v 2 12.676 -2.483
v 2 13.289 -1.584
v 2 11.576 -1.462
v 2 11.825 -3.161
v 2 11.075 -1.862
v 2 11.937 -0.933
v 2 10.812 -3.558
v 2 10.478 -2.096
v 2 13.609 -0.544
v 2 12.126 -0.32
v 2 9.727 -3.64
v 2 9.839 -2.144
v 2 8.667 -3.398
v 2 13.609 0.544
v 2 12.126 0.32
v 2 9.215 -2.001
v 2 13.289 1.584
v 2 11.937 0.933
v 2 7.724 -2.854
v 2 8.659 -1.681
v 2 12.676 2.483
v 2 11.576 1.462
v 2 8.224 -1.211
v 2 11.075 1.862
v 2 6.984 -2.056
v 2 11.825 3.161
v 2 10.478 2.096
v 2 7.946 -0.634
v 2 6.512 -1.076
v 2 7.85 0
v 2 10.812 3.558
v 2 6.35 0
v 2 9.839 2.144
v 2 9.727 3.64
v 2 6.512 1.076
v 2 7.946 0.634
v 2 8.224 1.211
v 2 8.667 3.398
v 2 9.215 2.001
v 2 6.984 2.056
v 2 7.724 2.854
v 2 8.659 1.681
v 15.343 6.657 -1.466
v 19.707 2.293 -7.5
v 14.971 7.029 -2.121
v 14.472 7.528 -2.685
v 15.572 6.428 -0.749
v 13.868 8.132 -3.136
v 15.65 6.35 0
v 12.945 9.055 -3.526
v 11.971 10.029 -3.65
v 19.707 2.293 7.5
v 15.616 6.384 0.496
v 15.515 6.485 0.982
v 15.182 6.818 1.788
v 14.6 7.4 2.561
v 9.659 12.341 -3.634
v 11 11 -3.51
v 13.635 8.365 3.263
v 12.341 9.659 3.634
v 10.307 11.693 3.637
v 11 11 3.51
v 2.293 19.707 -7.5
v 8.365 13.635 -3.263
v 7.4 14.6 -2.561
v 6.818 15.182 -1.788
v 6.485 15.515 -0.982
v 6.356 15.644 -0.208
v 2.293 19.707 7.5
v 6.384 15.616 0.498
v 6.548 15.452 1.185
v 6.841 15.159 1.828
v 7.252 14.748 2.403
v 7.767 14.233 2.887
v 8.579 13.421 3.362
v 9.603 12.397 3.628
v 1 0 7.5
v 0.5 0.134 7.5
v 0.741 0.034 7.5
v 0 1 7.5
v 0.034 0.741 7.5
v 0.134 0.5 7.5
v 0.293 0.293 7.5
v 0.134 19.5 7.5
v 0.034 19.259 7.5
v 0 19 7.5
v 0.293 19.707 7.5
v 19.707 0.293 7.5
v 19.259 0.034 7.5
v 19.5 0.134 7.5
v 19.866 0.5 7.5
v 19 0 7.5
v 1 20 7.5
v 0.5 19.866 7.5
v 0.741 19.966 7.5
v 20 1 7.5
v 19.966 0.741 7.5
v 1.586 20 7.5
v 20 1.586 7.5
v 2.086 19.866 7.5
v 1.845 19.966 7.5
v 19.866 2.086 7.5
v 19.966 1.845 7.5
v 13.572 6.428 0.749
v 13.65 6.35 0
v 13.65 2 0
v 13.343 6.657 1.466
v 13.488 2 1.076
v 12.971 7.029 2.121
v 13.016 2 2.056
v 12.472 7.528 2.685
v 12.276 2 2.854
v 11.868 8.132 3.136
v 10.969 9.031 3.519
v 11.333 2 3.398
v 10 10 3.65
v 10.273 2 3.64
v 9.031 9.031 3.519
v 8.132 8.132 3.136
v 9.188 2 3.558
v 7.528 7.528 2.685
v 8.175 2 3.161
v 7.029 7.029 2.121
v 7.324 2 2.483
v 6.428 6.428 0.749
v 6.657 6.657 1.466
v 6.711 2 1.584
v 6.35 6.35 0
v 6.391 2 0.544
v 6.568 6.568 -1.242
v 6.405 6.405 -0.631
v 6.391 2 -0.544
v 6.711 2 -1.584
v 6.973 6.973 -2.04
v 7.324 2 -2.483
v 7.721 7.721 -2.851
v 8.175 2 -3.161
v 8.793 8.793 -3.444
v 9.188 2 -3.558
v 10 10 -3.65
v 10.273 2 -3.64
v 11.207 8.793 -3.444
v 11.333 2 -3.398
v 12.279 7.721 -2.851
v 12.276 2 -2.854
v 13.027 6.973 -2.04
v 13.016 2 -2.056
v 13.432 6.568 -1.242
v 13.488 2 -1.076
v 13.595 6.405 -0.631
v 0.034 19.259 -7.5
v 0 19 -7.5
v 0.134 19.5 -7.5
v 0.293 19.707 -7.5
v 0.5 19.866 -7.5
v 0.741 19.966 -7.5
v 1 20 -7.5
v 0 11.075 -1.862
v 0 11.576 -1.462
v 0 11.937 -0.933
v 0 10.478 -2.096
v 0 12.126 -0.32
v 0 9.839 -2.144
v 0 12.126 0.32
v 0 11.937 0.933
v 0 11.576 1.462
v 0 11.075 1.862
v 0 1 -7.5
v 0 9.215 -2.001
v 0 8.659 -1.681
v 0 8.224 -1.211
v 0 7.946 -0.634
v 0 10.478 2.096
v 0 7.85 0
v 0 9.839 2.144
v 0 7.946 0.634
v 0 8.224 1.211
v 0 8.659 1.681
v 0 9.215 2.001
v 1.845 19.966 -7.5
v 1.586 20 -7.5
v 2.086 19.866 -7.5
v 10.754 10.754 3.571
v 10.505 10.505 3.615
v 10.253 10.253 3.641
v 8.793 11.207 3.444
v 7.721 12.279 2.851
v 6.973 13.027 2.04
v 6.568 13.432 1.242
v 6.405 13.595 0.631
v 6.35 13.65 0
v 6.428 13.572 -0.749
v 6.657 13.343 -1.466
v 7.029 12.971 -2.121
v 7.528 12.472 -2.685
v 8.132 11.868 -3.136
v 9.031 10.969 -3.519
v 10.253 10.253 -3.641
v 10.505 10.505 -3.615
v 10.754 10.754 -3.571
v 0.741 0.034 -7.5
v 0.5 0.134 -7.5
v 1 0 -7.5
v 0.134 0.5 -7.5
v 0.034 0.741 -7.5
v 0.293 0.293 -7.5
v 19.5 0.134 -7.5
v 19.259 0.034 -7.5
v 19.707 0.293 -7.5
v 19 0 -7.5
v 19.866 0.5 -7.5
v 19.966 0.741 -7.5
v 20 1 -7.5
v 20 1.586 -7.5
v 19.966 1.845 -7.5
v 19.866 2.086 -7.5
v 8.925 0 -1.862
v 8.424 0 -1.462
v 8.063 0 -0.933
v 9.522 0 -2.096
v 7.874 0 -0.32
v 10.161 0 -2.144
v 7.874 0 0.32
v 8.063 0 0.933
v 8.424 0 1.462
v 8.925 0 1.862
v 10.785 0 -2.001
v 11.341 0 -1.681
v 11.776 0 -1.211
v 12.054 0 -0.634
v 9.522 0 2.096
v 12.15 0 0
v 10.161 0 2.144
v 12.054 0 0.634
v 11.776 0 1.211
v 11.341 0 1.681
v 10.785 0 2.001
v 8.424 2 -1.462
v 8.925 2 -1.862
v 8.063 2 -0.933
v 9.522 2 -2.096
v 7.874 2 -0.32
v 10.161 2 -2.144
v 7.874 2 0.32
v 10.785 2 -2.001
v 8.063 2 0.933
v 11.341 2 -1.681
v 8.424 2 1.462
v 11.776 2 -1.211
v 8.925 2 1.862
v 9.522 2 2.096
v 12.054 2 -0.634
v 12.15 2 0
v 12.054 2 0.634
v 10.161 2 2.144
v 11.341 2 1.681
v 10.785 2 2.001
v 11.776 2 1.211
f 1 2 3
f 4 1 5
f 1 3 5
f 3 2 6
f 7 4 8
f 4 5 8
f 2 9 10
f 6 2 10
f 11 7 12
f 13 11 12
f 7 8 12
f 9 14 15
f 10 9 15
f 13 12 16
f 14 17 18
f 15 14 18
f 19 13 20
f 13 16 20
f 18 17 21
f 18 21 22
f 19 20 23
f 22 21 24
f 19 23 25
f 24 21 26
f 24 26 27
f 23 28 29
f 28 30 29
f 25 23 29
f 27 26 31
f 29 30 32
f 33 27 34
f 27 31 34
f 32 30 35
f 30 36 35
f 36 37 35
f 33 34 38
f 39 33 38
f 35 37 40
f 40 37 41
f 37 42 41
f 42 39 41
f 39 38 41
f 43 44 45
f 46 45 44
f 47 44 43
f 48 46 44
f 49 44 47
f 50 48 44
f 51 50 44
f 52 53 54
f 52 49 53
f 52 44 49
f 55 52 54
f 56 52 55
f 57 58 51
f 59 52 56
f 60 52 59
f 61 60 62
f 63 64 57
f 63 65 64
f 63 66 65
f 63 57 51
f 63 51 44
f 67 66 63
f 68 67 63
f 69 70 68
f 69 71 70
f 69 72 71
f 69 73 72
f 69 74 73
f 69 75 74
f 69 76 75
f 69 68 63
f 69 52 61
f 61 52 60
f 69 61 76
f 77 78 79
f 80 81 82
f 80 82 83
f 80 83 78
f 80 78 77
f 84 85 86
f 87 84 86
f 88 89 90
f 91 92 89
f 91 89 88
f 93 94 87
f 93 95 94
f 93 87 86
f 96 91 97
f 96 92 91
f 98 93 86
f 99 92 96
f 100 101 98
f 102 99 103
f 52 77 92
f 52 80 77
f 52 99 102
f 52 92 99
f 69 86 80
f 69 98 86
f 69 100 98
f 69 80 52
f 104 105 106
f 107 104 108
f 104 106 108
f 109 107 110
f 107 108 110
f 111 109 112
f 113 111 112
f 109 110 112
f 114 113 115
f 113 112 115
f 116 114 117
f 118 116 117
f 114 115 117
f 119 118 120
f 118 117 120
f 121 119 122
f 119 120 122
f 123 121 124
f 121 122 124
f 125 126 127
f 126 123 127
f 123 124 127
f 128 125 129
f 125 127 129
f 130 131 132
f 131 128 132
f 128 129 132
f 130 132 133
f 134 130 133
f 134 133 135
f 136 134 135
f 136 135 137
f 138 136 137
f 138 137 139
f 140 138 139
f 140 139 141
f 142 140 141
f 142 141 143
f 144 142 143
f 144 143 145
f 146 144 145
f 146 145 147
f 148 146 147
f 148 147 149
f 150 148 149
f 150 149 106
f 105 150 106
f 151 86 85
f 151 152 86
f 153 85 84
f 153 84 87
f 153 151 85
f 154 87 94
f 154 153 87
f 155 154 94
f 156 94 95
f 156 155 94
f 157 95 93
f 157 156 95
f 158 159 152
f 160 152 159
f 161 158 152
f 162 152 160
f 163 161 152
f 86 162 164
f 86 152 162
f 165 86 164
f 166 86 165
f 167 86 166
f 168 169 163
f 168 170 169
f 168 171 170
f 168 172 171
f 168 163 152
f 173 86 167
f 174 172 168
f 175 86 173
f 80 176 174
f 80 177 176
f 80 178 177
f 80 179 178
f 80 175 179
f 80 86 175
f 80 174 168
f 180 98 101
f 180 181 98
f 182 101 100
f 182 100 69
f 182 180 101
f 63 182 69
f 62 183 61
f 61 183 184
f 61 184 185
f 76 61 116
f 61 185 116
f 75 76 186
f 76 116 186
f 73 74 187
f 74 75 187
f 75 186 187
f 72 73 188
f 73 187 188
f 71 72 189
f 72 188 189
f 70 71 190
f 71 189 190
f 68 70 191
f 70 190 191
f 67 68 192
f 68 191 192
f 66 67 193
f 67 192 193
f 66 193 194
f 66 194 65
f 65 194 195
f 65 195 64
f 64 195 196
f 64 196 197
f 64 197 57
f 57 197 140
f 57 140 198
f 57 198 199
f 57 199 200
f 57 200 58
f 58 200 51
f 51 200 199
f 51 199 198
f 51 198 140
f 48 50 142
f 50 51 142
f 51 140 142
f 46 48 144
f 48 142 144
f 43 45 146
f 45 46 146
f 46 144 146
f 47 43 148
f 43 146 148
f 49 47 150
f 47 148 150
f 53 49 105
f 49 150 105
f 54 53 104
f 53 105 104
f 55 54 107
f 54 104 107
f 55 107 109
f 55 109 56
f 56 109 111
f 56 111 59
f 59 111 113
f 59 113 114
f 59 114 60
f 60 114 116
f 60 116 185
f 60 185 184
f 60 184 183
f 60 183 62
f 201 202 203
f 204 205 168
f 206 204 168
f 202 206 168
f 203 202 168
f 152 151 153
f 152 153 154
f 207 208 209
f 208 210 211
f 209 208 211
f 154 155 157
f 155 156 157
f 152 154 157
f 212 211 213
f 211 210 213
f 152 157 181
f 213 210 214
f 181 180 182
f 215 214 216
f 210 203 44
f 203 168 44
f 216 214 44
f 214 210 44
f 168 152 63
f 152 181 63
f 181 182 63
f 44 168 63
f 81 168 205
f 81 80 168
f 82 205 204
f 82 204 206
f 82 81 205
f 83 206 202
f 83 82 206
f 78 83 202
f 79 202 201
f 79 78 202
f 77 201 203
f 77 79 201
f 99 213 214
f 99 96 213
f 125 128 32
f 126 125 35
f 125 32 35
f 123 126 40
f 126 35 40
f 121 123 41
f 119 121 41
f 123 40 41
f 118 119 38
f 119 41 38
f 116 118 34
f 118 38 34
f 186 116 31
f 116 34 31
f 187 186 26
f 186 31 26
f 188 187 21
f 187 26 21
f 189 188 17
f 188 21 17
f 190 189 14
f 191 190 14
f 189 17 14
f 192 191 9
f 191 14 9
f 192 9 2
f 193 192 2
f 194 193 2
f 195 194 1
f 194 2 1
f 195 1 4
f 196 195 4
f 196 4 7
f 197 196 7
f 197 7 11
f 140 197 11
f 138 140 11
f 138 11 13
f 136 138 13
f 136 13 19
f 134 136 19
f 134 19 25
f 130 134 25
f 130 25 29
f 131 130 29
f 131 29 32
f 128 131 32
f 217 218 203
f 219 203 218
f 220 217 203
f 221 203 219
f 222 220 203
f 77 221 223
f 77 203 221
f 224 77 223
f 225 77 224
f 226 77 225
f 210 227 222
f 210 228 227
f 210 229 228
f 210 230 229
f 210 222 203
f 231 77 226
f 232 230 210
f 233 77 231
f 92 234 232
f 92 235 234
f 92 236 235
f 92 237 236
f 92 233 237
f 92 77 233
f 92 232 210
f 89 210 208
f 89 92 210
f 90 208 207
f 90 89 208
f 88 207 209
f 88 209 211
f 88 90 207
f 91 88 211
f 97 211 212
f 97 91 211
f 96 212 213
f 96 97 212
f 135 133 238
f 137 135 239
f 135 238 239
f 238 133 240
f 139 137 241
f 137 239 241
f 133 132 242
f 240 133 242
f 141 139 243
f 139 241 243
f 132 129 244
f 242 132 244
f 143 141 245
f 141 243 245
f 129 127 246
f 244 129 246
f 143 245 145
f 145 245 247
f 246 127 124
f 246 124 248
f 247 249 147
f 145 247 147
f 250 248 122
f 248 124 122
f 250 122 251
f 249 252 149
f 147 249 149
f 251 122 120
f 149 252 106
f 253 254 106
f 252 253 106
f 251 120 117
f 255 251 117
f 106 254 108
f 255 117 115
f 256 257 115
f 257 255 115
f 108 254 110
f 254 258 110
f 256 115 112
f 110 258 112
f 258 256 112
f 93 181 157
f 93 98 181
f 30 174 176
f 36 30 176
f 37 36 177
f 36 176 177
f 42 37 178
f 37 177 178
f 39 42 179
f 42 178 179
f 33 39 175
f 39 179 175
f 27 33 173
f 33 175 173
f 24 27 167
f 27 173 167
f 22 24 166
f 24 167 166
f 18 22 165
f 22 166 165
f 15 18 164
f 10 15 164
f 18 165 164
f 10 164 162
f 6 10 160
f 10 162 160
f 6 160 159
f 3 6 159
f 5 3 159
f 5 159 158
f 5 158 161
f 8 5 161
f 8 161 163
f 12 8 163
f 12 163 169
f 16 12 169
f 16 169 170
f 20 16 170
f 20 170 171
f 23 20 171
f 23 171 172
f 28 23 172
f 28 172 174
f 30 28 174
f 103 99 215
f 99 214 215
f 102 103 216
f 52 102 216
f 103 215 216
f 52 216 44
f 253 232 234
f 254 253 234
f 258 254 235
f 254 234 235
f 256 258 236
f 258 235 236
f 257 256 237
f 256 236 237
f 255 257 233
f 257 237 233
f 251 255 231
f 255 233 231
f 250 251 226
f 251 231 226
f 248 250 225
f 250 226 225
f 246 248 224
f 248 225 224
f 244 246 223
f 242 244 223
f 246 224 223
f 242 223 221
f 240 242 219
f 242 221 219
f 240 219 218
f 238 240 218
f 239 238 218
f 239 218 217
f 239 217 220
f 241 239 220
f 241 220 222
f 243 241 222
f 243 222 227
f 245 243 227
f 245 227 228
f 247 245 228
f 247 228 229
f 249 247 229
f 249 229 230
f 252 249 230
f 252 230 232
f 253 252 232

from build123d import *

# Parameters (mm, degrees)
F1_DEPTH = 7.5
F3_R     = 2.15
F4_DEPTH = 20
F2_R     = 2.15
F5_DEPTH = 20
F6_START = -2
F2_R_2   = 3.65
F6_DEPTH = 18
F7_START = -2
F3_R_2   = 3.65
F7_DEPTH = 18
F8_R     = 1


with BuildPart() as f1:
    # F0 (on Top) → F1 (new body, symmetric)
    with BuildSketch(Plane.XY):
        Polygon((0, 20), (0, 0), (20, 0), (20, 2), (2, 20), align=None)
    extrude(amount=F1_DEPTH, both=True)

    # F3 (on face) → F4 (cut)
    with BuildSketch(Plane.XZ):
        with Locations((10, 0)):
            Circle(F3_R)
    extrude(amount=-F4_DEPTH, mode=Mode.SUBTRACT)

    # F2 (on face) → F5 (cut)
    with BuildSketch(Plane(origin=(0, 0, 0), x_dir=(0, -1, 0), z_dir=(-1, 0, 0))):
        with Locations((-10, 0)):
            Circle(F2_R)
    extrude(amount=-F5_DEPTH, mode=Mode.SUBTRACT)

    # F2 (on face) → F6 (cut)
    with BuildSketch(Plane(origin=(0, 0, 0), x_dir=(0, -1, 0), z_dir=(-1, 0, 0)).offset(F6_START)):
        with Locations((-10, 0)):
            Circle(F2_R_2)
        with Locations((-10, 0)):
            Circle(F2_R, mode=Mode.SUBTRACT)
    extrude(amount=-F6_DEPTH, mode=Mode.SUBTRACT)

    # F3 (on face) → F7 (cut)
    with BuildSketch(Plane.XZ.offset(F7_START)):
        with Locations((10, 0)):
            Circle(F3_R_2)
        with Locations((10, 0)):
            Circle(F3_R, mode=Mode.SUBTRACT)
    extrude(amount=-F7_DEPTH, mode=Mode.SUBTRACT)

    # F8
    f8_edges = [f1.edges().sort_by_distance(p)[0] for p in [
        (0, 0, 0),
        (20, 0, 0),
        (20, 2, 0),
        (2, 20, 0),
        (0, 20, 0),
    ]]
    fillet(f8_edges, radius=F8_R)


solid = f1.part
